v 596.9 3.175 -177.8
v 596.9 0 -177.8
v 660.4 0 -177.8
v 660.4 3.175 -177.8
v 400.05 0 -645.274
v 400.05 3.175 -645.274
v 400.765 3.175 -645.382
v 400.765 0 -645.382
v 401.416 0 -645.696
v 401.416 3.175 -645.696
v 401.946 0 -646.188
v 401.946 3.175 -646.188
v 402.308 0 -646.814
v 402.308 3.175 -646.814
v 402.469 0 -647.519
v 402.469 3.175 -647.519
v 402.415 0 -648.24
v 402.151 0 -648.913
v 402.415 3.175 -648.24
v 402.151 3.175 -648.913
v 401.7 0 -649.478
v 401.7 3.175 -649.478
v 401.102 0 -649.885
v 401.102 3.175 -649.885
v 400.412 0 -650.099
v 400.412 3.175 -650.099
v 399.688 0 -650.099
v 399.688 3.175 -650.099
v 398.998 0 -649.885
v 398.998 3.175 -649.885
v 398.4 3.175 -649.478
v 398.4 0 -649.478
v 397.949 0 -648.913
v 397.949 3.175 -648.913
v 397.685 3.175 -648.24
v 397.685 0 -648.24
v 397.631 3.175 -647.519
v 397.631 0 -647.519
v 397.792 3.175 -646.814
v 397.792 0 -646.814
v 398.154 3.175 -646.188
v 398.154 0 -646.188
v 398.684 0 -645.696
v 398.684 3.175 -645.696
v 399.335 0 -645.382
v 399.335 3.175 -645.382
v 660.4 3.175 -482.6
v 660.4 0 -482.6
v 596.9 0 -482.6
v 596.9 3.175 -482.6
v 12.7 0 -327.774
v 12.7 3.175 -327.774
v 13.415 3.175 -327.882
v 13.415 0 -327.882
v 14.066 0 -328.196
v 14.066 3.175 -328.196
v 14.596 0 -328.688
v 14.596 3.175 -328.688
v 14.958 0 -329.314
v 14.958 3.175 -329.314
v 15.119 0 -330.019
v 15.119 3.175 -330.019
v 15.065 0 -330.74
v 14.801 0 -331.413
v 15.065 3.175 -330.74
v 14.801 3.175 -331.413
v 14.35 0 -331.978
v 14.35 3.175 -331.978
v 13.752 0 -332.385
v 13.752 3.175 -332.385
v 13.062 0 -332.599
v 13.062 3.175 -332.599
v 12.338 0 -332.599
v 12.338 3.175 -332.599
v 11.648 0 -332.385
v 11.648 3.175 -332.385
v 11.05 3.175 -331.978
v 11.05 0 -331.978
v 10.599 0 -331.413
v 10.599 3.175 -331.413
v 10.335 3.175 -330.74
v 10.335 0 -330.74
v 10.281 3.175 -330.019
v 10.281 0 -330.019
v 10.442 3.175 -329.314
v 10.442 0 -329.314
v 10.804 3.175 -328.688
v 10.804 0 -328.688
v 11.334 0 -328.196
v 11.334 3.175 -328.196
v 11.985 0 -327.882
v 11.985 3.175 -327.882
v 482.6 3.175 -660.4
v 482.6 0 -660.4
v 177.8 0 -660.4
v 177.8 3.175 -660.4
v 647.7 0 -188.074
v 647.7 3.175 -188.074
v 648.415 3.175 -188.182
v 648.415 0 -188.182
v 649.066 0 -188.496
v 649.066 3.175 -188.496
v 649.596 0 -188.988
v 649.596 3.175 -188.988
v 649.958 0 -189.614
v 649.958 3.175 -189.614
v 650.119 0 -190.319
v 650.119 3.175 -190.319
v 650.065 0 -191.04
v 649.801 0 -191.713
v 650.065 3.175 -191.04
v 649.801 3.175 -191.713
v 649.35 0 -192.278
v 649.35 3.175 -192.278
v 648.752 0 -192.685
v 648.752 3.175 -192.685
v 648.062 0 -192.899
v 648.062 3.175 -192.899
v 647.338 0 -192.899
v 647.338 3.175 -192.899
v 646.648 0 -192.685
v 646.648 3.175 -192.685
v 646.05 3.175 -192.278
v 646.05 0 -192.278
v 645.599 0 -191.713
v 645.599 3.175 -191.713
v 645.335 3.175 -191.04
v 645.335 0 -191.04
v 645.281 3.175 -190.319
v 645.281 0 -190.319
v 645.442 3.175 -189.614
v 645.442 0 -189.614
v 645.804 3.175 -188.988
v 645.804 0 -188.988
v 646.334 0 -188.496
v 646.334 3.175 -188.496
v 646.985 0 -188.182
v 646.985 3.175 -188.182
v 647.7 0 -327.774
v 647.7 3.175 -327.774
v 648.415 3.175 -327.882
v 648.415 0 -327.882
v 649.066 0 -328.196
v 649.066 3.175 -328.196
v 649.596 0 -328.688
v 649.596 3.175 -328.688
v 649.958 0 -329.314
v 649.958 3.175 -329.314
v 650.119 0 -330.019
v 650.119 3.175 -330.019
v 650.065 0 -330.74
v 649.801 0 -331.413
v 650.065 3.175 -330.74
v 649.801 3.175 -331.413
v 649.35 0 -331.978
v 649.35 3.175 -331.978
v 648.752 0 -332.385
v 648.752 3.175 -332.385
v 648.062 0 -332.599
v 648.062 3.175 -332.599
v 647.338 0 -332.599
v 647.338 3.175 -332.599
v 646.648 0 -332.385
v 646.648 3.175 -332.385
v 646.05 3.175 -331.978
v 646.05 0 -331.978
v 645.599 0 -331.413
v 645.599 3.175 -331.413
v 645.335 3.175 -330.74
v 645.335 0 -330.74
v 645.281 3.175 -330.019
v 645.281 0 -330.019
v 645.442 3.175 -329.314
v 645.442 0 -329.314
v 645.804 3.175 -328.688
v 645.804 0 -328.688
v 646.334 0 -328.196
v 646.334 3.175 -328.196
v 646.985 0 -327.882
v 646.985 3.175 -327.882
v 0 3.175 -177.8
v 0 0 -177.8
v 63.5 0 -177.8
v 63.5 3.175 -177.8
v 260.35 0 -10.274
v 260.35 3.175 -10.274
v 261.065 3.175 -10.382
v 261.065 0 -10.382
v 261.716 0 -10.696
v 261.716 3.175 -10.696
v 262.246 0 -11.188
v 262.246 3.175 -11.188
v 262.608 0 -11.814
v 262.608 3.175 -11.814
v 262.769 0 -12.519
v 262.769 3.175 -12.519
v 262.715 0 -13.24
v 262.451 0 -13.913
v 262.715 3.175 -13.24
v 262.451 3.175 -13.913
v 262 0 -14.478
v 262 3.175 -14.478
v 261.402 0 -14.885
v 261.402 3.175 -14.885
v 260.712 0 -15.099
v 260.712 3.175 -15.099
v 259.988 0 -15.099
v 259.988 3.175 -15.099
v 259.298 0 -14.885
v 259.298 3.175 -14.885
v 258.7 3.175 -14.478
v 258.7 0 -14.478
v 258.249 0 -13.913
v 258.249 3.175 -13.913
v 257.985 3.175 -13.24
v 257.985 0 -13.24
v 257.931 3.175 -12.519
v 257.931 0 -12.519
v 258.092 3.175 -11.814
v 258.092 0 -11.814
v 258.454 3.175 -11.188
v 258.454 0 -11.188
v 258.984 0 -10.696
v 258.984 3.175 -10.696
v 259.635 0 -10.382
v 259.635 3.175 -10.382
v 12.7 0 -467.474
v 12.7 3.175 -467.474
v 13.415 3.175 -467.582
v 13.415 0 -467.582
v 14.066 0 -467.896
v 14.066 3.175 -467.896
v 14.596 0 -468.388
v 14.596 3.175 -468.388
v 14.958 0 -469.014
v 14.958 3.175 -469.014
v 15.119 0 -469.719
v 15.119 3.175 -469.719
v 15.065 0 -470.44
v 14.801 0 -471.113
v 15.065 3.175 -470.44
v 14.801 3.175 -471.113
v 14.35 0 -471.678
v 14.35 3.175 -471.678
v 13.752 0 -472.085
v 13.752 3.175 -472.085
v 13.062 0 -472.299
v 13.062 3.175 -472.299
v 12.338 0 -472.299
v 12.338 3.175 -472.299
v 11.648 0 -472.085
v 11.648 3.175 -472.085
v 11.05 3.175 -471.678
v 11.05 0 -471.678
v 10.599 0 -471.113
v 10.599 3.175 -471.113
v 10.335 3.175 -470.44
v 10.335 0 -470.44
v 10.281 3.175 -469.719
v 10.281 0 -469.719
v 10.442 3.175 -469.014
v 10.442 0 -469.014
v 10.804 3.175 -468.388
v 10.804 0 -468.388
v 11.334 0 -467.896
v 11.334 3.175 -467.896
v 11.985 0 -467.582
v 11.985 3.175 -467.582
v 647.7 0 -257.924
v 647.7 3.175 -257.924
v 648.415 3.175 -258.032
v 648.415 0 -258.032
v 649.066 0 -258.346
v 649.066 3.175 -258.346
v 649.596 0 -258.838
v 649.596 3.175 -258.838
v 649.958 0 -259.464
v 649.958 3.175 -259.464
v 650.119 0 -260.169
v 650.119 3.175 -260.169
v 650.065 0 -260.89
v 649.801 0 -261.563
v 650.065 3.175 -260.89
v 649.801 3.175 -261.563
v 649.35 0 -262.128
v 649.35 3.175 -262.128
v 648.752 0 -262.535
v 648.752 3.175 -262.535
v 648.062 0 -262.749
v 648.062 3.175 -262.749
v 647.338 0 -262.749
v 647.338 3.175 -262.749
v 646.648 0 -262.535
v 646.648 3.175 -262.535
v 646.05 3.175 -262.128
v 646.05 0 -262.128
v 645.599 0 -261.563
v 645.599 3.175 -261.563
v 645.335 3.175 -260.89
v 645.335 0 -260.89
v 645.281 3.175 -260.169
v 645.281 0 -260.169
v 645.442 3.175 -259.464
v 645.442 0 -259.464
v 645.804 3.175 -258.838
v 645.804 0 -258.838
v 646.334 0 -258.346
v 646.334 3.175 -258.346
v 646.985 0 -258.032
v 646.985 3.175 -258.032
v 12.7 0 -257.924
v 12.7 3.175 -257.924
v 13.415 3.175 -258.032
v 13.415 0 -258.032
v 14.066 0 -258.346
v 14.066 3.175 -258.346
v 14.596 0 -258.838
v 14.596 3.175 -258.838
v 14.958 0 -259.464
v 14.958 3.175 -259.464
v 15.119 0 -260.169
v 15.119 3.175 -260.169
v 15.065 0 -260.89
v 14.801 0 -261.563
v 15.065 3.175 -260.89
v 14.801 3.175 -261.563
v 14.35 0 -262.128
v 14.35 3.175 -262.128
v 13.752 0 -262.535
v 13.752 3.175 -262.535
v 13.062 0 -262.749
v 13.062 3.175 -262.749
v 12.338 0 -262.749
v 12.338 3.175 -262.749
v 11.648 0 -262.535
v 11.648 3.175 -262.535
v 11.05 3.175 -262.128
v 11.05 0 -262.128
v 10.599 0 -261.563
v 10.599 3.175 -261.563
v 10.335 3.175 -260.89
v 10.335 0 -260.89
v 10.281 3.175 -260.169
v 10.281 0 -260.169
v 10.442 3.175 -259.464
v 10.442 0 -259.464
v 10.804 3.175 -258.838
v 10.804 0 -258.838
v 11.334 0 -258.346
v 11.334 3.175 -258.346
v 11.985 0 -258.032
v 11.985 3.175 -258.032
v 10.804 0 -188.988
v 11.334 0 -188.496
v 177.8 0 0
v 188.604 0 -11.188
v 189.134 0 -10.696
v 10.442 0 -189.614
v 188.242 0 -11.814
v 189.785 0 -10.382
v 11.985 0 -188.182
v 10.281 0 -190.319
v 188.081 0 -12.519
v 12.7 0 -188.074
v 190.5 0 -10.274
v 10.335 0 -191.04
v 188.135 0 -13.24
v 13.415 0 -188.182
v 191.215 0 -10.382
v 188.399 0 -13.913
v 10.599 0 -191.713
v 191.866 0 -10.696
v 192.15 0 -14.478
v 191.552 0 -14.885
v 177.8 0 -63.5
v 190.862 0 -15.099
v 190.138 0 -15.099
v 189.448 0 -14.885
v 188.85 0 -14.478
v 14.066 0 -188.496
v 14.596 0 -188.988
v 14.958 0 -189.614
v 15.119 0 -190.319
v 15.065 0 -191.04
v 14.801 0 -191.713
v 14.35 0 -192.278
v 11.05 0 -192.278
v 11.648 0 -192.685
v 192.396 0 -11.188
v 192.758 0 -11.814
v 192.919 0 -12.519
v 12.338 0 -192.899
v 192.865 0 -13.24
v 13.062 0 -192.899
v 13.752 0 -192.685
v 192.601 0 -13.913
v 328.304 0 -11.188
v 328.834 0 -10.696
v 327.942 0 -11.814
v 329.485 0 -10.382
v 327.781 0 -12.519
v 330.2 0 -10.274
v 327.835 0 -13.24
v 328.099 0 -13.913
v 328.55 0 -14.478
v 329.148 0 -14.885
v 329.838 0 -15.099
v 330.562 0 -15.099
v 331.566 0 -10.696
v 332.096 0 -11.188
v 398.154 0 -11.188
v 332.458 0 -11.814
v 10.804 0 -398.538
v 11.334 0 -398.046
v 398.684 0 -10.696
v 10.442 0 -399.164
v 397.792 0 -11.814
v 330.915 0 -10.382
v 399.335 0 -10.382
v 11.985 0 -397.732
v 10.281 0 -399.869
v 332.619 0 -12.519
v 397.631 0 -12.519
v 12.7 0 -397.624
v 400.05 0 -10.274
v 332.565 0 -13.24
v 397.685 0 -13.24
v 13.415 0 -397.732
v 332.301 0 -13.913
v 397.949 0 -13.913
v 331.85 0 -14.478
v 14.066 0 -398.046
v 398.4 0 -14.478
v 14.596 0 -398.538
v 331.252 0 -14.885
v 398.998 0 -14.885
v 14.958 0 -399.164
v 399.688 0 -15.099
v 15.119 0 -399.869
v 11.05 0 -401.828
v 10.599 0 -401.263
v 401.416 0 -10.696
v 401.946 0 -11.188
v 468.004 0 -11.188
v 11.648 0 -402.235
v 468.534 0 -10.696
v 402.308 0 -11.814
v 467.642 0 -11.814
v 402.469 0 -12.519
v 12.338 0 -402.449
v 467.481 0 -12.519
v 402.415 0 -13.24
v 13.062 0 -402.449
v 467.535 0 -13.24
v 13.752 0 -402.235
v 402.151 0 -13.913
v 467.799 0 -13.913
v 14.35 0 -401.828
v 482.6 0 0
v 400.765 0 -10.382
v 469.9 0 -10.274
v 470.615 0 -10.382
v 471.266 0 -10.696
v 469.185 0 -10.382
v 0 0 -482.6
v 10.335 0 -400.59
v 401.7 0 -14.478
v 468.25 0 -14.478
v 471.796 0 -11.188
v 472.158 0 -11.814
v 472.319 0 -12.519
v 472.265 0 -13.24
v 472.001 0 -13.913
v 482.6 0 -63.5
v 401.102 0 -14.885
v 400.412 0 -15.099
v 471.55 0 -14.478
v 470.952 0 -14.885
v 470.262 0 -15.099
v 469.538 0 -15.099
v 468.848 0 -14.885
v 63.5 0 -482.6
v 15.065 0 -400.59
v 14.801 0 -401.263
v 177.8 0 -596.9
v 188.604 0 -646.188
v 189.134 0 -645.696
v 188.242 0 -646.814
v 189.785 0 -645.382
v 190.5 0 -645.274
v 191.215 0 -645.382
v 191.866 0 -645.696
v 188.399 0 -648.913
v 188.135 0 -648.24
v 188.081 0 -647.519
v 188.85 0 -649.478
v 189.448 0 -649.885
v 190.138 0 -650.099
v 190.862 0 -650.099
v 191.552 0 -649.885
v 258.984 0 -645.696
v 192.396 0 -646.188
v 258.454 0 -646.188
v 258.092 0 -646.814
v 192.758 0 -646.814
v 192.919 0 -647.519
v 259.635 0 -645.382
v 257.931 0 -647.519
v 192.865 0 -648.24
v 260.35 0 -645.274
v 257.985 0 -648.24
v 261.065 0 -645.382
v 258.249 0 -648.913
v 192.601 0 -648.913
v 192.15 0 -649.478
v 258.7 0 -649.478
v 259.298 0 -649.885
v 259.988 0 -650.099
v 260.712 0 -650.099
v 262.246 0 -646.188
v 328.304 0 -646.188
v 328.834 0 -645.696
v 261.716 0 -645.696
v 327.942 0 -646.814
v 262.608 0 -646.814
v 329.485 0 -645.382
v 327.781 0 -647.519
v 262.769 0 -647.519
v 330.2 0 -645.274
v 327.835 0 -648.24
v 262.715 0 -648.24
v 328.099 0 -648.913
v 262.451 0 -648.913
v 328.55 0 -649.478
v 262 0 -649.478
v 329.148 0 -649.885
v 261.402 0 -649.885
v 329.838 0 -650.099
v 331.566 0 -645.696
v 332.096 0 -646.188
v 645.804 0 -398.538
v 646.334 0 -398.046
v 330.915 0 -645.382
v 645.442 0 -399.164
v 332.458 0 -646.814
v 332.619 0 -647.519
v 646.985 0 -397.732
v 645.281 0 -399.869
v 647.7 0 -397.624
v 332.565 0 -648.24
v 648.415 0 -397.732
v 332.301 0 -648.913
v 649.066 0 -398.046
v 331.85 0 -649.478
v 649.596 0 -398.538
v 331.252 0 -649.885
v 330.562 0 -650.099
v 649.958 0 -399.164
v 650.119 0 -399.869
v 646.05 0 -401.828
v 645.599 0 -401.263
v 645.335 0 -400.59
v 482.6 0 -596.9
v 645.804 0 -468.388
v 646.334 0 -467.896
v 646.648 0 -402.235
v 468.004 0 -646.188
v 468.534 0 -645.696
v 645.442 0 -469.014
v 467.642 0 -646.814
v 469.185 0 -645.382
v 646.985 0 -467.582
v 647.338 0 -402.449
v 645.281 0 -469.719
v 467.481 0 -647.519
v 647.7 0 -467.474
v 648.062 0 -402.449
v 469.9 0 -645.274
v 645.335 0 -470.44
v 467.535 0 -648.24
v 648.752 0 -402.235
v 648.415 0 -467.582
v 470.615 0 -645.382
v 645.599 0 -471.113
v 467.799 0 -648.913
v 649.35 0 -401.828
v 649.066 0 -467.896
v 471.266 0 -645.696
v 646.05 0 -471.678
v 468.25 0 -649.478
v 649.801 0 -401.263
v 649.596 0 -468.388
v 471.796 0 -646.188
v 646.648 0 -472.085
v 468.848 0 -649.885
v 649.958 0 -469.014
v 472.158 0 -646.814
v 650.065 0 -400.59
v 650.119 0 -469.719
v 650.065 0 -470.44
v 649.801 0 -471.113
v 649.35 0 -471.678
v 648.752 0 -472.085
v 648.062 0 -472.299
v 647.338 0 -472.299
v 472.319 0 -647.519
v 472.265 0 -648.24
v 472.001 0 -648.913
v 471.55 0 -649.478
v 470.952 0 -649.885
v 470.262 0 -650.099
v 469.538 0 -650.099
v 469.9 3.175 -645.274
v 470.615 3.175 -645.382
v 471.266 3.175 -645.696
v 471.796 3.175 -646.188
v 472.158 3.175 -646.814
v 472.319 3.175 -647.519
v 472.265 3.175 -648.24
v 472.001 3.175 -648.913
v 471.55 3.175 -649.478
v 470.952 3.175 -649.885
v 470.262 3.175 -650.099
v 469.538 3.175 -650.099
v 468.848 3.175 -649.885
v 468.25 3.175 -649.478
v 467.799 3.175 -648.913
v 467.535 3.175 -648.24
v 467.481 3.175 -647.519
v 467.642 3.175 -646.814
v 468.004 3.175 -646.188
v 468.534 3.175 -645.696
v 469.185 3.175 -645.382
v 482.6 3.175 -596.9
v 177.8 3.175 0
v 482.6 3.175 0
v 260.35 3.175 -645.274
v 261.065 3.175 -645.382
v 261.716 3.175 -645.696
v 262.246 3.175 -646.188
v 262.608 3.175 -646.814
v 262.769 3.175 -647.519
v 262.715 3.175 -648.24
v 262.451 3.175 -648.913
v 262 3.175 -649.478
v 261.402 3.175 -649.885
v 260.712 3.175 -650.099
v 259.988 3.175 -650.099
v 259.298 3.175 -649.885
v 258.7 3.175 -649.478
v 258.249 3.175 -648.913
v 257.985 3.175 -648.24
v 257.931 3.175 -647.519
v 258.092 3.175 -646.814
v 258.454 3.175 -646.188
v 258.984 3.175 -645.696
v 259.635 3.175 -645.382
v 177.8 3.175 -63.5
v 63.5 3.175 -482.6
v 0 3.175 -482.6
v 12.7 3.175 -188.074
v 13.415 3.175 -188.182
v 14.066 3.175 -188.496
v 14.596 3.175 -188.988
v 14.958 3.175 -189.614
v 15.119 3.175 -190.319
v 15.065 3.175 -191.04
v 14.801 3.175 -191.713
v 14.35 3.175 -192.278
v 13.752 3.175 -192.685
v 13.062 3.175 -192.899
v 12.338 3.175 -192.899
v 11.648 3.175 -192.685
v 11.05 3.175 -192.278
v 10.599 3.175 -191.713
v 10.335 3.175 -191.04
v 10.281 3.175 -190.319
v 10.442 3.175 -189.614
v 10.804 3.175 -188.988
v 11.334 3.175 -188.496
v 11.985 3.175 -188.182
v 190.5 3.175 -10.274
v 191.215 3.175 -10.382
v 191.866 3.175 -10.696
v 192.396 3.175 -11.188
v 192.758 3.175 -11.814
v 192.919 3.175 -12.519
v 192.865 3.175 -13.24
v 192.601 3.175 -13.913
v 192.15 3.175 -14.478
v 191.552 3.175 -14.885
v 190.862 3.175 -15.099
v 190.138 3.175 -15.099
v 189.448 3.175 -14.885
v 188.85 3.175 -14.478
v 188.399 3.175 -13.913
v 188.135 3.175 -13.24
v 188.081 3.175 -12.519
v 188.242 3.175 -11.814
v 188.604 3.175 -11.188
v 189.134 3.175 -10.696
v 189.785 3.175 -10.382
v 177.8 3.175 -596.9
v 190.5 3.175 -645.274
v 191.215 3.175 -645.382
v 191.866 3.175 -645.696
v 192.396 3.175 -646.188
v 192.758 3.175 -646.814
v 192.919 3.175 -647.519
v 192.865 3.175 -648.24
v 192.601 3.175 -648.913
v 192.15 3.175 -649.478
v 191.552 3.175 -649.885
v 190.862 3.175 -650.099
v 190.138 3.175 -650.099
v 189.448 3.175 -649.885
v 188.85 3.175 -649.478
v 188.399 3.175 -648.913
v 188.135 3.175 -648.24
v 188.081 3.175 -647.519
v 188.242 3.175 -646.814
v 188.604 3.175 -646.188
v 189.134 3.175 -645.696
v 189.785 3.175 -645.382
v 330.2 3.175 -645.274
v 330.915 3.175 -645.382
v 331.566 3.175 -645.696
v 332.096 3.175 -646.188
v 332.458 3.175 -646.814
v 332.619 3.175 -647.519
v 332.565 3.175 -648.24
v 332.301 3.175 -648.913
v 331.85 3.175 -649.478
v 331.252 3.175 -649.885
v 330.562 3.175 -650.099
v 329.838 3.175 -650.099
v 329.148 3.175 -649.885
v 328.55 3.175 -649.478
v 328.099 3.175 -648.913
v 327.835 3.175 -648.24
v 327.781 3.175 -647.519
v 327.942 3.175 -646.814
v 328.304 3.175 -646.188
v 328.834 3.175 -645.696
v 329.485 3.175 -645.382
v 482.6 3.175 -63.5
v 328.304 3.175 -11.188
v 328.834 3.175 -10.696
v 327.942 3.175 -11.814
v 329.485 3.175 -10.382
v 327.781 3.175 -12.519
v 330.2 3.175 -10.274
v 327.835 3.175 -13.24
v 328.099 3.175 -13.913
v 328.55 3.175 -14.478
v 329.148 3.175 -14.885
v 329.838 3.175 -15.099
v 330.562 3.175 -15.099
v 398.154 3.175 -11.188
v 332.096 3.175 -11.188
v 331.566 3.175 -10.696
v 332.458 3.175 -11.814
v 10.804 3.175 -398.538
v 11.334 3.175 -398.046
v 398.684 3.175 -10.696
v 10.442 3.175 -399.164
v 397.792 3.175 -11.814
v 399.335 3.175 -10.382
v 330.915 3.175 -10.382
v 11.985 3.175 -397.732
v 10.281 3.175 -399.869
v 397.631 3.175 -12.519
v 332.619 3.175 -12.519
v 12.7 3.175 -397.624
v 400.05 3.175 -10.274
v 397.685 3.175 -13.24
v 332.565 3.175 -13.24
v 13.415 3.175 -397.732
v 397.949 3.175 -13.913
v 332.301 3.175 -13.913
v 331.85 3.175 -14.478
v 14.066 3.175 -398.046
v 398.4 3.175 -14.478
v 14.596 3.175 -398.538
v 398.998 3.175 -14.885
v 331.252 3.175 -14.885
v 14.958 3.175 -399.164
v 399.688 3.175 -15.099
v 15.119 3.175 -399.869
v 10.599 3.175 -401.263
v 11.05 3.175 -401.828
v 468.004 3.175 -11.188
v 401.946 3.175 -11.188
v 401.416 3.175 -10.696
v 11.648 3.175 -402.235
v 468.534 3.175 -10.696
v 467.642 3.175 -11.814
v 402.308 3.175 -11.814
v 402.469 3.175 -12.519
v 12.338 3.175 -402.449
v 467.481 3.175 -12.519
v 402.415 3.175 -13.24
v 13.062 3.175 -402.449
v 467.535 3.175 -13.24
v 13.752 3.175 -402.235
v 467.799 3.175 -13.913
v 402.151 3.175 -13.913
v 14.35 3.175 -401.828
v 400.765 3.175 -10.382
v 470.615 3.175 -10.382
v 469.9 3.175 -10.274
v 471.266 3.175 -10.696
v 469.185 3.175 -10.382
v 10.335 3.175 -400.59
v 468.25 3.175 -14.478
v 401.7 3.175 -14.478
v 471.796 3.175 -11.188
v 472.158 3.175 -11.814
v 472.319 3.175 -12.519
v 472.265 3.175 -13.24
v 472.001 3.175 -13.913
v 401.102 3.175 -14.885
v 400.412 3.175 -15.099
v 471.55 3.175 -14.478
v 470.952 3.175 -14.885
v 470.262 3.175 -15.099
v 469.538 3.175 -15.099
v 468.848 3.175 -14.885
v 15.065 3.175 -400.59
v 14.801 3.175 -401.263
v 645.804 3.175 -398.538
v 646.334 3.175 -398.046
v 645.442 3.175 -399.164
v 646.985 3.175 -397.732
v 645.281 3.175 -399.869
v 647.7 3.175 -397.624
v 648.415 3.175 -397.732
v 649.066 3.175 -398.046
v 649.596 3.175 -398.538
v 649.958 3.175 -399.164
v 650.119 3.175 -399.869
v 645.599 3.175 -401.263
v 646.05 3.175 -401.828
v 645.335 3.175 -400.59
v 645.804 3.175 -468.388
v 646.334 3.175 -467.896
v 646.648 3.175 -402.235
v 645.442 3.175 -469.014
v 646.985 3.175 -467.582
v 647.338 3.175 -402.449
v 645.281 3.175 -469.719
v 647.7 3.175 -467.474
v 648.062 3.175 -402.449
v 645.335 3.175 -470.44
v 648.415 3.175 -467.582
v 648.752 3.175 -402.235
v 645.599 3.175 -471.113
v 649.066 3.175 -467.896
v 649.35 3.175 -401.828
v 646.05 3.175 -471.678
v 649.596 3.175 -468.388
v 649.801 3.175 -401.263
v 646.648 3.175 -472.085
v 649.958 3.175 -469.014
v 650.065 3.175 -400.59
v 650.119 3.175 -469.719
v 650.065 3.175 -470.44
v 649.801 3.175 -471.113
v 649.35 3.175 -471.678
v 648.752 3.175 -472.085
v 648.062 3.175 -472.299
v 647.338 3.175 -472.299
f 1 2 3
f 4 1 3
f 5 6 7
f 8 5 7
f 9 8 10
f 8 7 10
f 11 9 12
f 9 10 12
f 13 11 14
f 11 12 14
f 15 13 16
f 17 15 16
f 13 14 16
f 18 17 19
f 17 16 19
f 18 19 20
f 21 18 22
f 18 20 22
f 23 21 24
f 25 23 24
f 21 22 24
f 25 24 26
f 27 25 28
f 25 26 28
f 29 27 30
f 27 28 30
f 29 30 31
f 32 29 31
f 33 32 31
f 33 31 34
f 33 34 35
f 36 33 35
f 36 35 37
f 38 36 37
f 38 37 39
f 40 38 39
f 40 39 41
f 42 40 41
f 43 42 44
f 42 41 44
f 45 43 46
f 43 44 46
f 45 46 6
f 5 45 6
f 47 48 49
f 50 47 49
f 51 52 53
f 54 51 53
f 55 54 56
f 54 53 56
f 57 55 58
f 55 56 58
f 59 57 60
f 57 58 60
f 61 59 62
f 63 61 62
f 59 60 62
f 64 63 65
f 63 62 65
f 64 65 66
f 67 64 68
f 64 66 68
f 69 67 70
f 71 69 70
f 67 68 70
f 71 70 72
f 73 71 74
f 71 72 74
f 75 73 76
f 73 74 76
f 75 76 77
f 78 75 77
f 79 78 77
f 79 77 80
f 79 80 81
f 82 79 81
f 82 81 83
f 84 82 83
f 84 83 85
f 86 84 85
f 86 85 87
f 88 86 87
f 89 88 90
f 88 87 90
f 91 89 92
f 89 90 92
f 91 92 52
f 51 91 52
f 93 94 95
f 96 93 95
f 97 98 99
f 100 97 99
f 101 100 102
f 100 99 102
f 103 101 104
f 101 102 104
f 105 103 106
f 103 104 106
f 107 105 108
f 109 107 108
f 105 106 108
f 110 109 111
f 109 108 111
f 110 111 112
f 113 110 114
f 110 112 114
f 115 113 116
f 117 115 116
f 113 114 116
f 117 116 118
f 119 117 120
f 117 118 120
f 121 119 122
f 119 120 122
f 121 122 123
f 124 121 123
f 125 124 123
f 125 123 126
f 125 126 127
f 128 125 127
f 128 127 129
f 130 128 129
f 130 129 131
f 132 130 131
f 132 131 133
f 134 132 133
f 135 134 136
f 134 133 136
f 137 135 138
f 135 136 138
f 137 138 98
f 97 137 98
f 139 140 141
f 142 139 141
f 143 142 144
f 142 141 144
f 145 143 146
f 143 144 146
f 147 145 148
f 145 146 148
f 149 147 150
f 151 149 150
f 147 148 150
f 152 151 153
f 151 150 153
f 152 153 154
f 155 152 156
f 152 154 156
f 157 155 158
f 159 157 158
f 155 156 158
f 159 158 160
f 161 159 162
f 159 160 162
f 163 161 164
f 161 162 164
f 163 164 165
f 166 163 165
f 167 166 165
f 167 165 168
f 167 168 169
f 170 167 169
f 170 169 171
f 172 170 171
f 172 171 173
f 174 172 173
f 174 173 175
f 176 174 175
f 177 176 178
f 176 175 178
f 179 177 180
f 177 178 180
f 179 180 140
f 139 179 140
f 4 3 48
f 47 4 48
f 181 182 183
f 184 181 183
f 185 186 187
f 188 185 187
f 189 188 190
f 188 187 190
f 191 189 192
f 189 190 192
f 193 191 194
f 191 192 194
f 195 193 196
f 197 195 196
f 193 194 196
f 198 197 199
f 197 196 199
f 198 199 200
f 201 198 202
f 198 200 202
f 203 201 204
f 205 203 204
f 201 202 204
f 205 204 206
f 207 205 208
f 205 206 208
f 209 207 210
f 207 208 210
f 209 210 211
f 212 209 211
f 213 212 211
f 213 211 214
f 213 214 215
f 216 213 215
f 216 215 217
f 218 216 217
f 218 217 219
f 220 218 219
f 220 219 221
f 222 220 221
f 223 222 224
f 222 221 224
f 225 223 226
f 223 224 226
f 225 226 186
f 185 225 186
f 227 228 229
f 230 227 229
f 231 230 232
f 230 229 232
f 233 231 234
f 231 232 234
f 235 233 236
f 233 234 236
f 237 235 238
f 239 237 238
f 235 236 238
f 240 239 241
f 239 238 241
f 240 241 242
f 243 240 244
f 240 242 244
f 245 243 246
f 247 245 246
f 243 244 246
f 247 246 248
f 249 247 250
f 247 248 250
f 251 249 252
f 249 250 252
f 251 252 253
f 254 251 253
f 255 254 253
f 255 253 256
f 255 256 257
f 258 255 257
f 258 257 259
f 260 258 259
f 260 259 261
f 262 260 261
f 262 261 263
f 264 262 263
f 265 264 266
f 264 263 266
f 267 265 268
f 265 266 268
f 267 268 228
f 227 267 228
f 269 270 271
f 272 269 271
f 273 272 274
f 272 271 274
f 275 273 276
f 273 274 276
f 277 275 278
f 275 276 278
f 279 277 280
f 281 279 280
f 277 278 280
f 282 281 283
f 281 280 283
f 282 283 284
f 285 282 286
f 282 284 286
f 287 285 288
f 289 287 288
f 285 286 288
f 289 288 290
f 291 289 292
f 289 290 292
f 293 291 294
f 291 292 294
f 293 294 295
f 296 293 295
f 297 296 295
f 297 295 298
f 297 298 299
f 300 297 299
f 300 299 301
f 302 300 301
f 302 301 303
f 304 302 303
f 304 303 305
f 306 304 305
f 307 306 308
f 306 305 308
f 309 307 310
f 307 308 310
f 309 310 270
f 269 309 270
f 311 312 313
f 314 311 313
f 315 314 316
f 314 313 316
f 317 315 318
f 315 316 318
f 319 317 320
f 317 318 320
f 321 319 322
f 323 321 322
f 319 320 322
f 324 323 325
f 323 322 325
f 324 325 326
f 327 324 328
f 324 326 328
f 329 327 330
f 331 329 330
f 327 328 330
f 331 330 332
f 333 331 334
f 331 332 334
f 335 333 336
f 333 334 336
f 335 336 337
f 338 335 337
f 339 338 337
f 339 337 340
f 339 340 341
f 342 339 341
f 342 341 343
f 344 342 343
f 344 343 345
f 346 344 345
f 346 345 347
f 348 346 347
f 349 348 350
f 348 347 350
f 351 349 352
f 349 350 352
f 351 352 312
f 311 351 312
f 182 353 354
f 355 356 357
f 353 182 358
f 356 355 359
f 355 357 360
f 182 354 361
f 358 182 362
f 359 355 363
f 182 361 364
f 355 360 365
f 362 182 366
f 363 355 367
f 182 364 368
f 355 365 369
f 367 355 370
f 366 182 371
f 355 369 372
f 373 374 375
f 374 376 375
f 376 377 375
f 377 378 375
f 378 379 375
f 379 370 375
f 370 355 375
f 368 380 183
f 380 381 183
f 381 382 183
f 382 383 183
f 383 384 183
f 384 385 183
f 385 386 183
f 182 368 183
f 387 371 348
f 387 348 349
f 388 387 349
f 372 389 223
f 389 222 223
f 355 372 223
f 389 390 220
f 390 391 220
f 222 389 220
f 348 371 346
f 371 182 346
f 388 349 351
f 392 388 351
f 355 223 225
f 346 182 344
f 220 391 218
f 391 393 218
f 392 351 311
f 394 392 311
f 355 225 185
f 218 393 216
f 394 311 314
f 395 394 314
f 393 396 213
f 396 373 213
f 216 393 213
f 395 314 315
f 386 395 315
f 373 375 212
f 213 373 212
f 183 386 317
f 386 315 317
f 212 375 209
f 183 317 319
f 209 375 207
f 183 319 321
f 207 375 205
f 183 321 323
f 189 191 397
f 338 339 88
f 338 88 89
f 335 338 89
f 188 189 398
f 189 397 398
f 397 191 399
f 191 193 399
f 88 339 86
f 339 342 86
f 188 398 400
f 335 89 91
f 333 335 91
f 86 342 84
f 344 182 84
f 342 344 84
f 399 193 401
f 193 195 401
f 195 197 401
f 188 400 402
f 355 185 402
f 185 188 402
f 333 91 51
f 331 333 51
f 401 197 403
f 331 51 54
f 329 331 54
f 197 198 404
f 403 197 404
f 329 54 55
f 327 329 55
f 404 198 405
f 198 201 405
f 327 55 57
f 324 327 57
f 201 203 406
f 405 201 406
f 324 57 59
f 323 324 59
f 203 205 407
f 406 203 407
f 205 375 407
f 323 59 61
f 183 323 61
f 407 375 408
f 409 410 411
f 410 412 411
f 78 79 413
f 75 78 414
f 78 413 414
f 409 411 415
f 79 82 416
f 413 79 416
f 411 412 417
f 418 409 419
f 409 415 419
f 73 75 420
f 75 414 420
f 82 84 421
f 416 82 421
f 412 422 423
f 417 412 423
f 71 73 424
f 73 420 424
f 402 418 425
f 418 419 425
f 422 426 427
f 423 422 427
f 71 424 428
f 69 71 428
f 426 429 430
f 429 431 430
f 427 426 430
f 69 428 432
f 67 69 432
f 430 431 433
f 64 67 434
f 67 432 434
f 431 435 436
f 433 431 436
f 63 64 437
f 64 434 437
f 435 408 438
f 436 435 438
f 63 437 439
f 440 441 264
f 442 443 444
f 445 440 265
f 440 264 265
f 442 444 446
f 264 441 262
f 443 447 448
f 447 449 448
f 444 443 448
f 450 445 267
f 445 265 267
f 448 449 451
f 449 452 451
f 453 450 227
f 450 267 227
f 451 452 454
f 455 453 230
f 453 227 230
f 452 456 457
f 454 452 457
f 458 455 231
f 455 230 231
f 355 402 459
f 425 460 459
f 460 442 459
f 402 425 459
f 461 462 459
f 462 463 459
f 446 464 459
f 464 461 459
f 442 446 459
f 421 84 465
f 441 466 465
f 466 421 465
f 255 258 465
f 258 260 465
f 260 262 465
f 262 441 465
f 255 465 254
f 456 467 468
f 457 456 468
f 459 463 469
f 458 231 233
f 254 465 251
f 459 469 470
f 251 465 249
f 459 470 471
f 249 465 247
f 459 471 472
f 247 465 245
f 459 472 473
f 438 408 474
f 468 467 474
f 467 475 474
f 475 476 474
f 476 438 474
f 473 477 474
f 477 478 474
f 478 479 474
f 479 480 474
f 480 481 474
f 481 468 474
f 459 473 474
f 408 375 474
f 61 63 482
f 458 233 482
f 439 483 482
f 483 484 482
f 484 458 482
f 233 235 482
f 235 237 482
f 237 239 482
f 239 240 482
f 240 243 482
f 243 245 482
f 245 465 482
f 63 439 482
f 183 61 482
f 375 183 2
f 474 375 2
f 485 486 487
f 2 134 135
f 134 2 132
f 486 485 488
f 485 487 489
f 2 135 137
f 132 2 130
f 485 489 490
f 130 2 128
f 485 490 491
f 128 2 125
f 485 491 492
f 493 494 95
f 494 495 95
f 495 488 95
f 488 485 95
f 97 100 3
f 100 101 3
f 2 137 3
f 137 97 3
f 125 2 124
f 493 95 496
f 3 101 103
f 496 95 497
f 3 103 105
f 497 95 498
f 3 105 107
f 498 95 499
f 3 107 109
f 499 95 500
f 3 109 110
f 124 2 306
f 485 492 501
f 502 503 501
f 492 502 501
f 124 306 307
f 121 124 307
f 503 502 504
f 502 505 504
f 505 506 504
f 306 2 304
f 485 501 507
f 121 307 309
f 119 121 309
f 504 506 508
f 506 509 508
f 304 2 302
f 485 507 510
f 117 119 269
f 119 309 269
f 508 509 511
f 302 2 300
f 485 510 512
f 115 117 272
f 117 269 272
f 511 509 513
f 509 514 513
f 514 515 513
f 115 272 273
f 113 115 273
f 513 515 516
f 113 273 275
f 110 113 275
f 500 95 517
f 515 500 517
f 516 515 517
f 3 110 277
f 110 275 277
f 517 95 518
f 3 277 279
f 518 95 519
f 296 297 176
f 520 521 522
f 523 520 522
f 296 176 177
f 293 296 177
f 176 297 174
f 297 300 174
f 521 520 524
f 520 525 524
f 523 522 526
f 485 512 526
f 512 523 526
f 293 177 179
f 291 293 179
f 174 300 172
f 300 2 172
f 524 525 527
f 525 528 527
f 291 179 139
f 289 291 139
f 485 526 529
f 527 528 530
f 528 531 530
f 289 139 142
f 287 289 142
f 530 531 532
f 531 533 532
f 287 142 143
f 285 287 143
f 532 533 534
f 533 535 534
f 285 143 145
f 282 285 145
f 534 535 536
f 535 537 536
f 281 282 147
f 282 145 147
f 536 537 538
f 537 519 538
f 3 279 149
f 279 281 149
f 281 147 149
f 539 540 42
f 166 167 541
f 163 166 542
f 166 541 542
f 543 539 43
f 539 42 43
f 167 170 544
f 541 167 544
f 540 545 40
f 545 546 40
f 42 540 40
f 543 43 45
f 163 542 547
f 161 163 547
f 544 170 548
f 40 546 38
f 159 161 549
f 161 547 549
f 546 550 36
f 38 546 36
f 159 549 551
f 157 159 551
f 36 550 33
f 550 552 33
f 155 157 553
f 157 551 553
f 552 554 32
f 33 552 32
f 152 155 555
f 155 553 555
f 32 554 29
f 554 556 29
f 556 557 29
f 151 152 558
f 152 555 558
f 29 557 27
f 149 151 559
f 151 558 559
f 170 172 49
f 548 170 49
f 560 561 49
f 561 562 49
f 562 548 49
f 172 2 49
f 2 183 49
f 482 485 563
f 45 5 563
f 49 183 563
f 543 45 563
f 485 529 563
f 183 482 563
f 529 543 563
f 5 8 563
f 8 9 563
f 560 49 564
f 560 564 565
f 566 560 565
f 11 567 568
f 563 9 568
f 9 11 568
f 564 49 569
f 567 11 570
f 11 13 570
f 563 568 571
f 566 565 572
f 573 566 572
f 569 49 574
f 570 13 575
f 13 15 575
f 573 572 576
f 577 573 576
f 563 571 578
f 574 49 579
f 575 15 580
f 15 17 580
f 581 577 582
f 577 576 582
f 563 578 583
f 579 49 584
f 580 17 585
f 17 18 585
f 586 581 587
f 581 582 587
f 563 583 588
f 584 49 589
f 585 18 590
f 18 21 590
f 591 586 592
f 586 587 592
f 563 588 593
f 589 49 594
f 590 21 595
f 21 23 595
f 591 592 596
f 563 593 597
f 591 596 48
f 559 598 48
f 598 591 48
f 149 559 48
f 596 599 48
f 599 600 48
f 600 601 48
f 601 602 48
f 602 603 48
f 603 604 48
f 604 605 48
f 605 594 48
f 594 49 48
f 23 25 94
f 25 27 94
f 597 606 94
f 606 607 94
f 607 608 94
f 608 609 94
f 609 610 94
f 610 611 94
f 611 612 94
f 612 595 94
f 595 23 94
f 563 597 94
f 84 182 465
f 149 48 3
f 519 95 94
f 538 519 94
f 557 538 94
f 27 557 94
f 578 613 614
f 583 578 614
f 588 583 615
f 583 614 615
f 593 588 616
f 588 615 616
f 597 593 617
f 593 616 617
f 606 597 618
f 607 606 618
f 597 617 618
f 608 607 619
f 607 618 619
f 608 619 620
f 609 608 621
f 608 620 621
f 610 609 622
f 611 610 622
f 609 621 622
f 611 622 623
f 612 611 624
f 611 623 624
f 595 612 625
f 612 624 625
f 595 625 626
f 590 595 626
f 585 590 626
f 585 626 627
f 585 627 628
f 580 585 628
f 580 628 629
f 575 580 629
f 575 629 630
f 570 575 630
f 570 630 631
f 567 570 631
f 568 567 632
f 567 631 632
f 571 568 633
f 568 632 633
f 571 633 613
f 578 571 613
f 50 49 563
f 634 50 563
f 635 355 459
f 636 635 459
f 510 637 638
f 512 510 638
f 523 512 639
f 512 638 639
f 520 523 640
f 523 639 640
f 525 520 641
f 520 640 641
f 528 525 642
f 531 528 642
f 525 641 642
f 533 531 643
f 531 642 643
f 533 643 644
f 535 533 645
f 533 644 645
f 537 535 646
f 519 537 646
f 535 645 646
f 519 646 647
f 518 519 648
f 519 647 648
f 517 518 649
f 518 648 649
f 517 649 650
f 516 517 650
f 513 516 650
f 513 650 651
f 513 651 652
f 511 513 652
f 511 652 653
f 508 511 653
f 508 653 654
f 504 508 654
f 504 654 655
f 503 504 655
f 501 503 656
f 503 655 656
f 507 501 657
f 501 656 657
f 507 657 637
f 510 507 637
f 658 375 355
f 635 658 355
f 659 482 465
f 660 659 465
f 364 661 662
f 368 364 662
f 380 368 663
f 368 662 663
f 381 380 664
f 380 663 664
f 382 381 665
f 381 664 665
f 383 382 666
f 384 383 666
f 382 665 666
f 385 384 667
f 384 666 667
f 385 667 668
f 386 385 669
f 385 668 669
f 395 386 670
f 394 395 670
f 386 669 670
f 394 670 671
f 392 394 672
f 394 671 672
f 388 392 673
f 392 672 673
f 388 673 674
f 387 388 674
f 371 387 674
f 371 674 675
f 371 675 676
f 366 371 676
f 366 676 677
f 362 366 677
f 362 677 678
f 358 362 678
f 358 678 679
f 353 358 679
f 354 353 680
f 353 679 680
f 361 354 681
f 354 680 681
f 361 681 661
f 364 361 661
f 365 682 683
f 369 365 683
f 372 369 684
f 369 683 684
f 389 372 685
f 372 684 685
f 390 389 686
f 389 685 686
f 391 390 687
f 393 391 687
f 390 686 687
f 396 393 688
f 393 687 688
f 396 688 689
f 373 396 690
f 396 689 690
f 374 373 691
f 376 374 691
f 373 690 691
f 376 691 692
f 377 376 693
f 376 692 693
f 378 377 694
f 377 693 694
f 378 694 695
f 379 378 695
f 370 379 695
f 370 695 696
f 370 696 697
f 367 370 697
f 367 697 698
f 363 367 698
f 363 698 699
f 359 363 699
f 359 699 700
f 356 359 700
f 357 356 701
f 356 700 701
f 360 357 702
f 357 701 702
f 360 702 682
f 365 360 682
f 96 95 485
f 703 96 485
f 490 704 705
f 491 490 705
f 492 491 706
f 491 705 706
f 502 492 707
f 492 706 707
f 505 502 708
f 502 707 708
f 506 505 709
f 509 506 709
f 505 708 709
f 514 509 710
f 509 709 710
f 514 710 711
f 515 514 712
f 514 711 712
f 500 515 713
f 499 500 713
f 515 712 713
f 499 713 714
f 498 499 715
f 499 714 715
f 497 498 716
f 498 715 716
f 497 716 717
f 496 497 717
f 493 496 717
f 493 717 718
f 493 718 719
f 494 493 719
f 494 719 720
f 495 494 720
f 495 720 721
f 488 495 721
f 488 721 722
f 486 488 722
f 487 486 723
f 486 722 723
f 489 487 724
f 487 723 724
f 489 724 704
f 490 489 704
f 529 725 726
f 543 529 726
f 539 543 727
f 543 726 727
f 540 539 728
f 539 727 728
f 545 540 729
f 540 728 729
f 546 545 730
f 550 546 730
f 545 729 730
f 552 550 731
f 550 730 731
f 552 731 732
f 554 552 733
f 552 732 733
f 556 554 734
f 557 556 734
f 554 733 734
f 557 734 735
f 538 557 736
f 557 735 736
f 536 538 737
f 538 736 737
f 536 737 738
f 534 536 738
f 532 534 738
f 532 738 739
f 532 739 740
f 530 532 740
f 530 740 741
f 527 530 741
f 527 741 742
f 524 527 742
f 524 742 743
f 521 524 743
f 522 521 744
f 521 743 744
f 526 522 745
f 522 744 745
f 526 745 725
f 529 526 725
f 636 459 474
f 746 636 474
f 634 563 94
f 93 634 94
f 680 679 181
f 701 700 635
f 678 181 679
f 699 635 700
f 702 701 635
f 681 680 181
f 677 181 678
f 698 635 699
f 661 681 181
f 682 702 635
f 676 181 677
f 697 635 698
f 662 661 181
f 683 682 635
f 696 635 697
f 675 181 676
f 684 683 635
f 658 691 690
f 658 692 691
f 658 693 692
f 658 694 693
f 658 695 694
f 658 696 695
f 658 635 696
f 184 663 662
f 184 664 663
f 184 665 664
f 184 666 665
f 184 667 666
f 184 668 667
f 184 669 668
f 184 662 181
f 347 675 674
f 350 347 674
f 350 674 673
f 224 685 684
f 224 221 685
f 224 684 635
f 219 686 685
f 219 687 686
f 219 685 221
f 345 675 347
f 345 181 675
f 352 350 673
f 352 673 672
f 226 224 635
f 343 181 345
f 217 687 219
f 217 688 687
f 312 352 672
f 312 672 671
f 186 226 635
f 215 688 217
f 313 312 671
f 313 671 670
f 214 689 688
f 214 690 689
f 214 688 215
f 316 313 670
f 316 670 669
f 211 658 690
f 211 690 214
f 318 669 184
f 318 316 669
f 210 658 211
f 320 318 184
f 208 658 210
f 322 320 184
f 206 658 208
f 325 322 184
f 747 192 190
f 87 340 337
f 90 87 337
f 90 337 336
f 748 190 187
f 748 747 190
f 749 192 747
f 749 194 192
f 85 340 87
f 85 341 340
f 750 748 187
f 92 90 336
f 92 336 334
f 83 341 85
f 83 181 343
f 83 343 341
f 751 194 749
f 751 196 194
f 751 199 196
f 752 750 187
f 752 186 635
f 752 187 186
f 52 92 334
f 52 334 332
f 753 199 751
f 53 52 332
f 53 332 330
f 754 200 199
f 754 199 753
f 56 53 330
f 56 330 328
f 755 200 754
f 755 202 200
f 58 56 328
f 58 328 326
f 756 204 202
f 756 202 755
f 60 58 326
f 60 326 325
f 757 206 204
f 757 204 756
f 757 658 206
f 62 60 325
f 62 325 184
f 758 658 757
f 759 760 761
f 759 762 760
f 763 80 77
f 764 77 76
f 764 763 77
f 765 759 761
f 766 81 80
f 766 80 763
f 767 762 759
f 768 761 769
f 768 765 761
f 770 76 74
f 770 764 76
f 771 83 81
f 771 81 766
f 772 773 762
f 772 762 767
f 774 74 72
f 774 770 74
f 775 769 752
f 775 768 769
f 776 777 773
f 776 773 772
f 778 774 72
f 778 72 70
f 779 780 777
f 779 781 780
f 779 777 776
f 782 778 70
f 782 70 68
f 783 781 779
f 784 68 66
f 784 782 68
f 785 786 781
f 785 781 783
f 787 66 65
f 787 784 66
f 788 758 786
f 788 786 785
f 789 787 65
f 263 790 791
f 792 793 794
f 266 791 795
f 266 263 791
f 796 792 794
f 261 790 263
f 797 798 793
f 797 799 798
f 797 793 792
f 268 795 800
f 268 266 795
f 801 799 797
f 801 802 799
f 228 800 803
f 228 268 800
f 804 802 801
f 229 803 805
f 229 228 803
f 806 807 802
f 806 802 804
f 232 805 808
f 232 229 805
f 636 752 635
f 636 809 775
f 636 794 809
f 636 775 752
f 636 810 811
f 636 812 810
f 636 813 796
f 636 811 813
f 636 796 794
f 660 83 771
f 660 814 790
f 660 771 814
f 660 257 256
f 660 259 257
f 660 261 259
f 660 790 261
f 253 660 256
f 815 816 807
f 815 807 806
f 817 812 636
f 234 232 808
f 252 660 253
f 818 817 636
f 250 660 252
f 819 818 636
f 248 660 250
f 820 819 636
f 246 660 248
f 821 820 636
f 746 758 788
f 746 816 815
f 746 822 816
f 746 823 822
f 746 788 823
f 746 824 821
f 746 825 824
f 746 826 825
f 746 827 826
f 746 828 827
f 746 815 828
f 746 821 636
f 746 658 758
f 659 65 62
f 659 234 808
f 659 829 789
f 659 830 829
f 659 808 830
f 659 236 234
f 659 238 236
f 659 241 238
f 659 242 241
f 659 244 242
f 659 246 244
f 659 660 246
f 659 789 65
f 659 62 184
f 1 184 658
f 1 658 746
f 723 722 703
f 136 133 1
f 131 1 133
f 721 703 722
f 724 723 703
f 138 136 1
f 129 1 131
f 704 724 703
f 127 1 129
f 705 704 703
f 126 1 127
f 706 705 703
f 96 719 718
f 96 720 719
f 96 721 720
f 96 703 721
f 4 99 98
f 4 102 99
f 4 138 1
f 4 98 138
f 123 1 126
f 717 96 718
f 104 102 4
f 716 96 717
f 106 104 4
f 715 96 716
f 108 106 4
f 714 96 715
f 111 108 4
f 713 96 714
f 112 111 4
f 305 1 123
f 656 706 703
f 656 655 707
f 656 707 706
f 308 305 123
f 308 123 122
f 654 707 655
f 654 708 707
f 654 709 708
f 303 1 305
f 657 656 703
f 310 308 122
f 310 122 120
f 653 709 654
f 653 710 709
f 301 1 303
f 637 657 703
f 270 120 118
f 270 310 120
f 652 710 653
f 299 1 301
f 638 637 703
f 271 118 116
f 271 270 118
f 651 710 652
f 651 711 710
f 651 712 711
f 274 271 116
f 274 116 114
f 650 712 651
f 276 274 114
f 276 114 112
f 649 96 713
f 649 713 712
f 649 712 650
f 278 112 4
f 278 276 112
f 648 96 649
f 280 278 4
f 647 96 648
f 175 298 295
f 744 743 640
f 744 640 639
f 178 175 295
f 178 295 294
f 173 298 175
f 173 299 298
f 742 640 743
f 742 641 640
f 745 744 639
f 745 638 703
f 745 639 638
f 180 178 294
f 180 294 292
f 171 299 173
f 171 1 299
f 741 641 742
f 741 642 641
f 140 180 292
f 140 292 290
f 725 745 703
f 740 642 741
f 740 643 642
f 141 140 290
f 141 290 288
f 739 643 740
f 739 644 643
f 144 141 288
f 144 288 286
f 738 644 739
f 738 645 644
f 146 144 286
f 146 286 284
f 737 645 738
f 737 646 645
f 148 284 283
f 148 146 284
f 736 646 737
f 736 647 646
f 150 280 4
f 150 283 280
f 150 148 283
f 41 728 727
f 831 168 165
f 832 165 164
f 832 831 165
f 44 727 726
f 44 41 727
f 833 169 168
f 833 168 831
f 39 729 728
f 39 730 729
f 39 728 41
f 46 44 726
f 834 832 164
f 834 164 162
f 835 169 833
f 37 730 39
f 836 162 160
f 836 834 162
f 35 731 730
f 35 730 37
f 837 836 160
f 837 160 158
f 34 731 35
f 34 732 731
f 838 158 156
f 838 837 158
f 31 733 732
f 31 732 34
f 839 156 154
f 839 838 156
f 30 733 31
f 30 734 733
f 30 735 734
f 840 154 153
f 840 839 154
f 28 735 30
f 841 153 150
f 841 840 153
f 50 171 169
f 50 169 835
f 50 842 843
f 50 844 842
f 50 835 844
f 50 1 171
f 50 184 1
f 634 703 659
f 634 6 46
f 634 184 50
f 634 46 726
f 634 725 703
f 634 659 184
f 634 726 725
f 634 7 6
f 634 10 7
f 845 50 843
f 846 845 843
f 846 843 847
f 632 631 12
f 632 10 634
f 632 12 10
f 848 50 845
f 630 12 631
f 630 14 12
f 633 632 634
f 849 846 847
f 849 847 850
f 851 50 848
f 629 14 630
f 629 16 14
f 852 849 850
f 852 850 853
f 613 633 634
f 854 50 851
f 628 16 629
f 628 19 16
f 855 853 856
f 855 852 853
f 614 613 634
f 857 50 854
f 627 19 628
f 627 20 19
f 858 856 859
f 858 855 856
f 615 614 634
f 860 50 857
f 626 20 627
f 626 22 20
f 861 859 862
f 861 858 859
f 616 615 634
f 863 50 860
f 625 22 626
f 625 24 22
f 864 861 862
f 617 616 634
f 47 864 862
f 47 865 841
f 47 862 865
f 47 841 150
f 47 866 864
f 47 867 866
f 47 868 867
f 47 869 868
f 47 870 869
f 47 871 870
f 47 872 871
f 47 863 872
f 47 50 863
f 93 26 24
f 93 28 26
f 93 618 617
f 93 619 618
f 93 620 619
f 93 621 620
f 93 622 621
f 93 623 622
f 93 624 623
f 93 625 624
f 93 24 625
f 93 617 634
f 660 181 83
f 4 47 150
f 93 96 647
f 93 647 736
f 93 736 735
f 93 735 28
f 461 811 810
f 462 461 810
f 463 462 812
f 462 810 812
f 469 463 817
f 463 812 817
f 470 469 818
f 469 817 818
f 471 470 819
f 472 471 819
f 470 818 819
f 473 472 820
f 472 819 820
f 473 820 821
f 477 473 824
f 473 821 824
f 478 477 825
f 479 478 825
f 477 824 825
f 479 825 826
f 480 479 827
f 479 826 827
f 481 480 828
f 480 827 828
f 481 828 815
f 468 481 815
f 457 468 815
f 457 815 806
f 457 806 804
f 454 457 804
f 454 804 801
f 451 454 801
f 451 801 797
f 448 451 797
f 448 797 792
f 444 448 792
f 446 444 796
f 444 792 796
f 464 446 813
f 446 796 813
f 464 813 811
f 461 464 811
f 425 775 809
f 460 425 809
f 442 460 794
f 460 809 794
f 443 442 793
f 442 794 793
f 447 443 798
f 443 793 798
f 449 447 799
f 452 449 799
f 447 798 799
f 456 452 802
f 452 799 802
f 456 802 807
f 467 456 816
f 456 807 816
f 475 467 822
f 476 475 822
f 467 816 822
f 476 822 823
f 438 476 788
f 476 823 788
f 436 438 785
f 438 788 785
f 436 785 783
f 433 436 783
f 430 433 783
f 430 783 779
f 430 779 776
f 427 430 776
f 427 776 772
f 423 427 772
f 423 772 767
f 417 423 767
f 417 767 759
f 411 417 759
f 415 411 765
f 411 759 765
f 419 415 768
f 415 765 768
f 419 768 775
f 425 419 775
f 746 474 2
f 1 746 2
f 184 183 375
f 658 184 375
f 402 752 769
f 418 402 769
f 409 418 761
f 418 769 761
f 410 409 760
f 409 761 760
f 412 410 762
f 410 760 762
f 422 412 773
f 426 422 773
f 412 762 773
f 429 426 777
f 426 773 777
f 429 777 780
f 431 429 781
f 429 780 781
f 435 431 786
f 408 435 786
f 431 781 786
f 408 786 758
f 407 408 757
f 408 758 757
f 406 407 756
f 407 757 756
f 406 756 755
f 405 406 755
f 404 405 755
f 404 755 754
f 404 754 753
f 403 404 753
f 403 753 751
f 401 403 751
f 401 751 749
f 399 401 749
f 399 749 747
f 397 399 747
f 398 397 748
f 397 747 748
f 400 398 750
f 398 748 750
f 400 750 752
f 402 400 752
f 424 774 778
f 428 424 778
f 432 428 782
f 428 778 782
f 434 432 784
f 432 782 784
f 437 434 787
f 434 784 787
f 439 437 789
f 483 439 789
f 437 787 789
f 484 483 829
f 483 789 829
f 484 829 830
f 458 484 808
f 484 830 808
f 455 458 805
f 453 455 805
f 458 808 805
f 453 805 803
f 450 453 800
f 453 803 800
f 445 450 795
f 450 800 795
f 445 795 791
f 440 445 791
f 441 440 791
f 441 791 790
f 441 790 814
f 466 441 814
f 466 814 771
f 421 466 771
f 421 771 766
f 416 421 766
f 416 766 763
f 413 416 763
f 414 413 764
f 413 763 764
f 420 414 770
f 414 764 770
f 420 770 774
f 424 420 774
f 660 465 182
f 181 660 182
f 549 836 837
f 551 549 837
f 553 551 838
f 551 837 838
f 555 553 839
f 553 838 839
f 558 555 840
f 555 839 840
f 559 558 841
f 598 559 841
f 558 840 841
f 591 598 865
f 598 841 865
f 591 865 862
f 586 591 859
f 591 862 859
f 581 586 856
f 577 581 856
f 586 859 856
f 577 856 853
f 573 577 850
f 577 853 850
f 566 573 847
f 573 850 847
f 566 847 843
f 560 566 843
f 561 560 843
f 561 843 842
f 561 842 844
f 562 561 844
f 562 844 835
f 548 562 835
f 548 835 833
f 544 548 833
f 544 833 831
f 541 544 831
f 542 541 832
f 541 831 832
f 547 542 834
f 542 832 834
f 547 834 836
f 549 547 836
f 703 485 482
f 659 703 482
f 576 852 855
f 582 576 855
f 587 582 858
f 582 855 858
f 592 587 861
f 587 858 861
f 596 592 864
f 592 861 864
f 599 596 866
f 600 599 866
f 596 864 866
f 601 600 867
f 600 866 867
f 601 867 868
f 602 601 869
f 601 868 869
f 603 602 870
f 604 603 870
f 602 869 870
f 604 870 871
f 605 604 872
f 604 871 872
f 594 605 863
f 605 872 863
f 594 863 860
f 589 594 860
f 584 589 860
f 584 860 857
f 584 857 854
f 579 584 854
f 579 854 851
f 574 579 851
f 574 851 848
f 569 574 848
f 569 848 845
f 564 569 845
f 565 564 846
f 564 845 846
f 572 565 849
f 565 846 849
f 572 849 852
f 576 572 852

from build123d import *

# Parameters (mm, degrees)
BOSS_EXTRUDE1_DEPTH = 3.175
SKETCH3_R           = 2.4257
CUT_EXTRUDE2_DEPTH  = 3.175


with BuildPart() as part:
    # Sketch1 → Boss-Extrude1 (new body)
    with BuildSketch(Plane(origin=(0, 0, 0), x_dir=(1, 0, 0), z_dir=(0, 1, 0))):
        Polygon((177.8, 596.9), (63.5, 482.6), (0, 482.6), (0, 177.8), (63.5, 177.8), (177.8, 63.5), (177.8, 0), (482.6, 0), (482.6, 63.5), (596.9, 177.8), (660.4, 177.8), (660.4, 482.6), (596.9, 482.6), (482.6, 596.9), (482.6, 660.4), (177.8, 660.4), align=None)
    extrude(amount=BOSS_EXTRUDE1_DEPTH)

    # Sketch3 → Cut-Extrude2 (cut)
    with BuildSketch(Plane(origin=(0, 3.175, 0), x_dir=(1, 0, 0), z_dir=(0, 1, 0))):
        with Locations(Location((190.5, 647.7, 0), (0, 0, 270))):
            Circle(SKETCH3_R)
        with Locations(Location((260.35, 647.7, 0), (0, 0, 270))):
            Circle(SKETCH3_R)
        with Locations(Location((469.9, 647.7, 0), (0, 0, 270))):
            Circle(SKETCH3_R)
        with Locations(Location((400.05, 647.7, 0), (0, 0, 270))):
            Circle(SKETCH3_R)
        with Locations(Location((330.2, 647.7, 0), (0, 0, 270))):
            Circle(SKETCH3_R)
        with Locations(Location((647.7, 469.9, 0), (0, 0, 270))):
            Circle(SKETCH3_R)
        with Locations(Location((647.7, 400.05, 0), (0, 0, 270))):
            Circle(SKETCH3_R)
        with Locations(Location((647.7, 330.2, 0), (0, 0, 270))):
            Circle(SKETCH3_R)
        with Locations(Location((647.7, 260.35, 0), (0, 0, 270))):
            Circle(SKETCH3_R)
        with Locations(Location((647.7, 190.5, 0), (0, 0, 270))):
            Circle(SKETCH3_R)
        with Locations(Location((469.9, 12.7, 0), (0, 0, 270))):
            Circle(SKETCH3_R)
        with Locations(Location((400.05, 12.7, 0), (0, 0, 270))):
            Circle(SKETCH3_R)
        with Locations(Location((330.2, 12.7, 0), (0, 0, 270))):
            Circle(SKETCH3_R)
        with Locations(Location((260.35, 12.7, 0), (0, 0, 270))):
            Circle(SKETCH3_R)
        with Locations(Location((190.5, 12.7, 0), (0, 0, 270))):
            Circle(SKETCH3_R)
        with Locations(Location((12.7, 190.5, 0), (0, 0, 270))):
            Circle(SKETCH3_R)
        with Locations(Location((12.7, 260.35, 0), (0, 0, 270))):
            Circle(SKETCH3_R)
        with Locations(Location((12.7, 330.2, 0), (0, 0, 270))):
            Circle(SKETCH3_R)
        with Locations(Location((12.7, 400.05, 0), (0, 0, 270))):
            Circle(SKETCH3_R)
        with Locations(Location((12.7, 469.9, 0), (0, 0, 270))):
            Circle(SKETCH3_R)
    extrude(amount=-CUT_EXTRUDE2_DEPTH, mode=Mode.SUBTRACT)


solid = part.part
